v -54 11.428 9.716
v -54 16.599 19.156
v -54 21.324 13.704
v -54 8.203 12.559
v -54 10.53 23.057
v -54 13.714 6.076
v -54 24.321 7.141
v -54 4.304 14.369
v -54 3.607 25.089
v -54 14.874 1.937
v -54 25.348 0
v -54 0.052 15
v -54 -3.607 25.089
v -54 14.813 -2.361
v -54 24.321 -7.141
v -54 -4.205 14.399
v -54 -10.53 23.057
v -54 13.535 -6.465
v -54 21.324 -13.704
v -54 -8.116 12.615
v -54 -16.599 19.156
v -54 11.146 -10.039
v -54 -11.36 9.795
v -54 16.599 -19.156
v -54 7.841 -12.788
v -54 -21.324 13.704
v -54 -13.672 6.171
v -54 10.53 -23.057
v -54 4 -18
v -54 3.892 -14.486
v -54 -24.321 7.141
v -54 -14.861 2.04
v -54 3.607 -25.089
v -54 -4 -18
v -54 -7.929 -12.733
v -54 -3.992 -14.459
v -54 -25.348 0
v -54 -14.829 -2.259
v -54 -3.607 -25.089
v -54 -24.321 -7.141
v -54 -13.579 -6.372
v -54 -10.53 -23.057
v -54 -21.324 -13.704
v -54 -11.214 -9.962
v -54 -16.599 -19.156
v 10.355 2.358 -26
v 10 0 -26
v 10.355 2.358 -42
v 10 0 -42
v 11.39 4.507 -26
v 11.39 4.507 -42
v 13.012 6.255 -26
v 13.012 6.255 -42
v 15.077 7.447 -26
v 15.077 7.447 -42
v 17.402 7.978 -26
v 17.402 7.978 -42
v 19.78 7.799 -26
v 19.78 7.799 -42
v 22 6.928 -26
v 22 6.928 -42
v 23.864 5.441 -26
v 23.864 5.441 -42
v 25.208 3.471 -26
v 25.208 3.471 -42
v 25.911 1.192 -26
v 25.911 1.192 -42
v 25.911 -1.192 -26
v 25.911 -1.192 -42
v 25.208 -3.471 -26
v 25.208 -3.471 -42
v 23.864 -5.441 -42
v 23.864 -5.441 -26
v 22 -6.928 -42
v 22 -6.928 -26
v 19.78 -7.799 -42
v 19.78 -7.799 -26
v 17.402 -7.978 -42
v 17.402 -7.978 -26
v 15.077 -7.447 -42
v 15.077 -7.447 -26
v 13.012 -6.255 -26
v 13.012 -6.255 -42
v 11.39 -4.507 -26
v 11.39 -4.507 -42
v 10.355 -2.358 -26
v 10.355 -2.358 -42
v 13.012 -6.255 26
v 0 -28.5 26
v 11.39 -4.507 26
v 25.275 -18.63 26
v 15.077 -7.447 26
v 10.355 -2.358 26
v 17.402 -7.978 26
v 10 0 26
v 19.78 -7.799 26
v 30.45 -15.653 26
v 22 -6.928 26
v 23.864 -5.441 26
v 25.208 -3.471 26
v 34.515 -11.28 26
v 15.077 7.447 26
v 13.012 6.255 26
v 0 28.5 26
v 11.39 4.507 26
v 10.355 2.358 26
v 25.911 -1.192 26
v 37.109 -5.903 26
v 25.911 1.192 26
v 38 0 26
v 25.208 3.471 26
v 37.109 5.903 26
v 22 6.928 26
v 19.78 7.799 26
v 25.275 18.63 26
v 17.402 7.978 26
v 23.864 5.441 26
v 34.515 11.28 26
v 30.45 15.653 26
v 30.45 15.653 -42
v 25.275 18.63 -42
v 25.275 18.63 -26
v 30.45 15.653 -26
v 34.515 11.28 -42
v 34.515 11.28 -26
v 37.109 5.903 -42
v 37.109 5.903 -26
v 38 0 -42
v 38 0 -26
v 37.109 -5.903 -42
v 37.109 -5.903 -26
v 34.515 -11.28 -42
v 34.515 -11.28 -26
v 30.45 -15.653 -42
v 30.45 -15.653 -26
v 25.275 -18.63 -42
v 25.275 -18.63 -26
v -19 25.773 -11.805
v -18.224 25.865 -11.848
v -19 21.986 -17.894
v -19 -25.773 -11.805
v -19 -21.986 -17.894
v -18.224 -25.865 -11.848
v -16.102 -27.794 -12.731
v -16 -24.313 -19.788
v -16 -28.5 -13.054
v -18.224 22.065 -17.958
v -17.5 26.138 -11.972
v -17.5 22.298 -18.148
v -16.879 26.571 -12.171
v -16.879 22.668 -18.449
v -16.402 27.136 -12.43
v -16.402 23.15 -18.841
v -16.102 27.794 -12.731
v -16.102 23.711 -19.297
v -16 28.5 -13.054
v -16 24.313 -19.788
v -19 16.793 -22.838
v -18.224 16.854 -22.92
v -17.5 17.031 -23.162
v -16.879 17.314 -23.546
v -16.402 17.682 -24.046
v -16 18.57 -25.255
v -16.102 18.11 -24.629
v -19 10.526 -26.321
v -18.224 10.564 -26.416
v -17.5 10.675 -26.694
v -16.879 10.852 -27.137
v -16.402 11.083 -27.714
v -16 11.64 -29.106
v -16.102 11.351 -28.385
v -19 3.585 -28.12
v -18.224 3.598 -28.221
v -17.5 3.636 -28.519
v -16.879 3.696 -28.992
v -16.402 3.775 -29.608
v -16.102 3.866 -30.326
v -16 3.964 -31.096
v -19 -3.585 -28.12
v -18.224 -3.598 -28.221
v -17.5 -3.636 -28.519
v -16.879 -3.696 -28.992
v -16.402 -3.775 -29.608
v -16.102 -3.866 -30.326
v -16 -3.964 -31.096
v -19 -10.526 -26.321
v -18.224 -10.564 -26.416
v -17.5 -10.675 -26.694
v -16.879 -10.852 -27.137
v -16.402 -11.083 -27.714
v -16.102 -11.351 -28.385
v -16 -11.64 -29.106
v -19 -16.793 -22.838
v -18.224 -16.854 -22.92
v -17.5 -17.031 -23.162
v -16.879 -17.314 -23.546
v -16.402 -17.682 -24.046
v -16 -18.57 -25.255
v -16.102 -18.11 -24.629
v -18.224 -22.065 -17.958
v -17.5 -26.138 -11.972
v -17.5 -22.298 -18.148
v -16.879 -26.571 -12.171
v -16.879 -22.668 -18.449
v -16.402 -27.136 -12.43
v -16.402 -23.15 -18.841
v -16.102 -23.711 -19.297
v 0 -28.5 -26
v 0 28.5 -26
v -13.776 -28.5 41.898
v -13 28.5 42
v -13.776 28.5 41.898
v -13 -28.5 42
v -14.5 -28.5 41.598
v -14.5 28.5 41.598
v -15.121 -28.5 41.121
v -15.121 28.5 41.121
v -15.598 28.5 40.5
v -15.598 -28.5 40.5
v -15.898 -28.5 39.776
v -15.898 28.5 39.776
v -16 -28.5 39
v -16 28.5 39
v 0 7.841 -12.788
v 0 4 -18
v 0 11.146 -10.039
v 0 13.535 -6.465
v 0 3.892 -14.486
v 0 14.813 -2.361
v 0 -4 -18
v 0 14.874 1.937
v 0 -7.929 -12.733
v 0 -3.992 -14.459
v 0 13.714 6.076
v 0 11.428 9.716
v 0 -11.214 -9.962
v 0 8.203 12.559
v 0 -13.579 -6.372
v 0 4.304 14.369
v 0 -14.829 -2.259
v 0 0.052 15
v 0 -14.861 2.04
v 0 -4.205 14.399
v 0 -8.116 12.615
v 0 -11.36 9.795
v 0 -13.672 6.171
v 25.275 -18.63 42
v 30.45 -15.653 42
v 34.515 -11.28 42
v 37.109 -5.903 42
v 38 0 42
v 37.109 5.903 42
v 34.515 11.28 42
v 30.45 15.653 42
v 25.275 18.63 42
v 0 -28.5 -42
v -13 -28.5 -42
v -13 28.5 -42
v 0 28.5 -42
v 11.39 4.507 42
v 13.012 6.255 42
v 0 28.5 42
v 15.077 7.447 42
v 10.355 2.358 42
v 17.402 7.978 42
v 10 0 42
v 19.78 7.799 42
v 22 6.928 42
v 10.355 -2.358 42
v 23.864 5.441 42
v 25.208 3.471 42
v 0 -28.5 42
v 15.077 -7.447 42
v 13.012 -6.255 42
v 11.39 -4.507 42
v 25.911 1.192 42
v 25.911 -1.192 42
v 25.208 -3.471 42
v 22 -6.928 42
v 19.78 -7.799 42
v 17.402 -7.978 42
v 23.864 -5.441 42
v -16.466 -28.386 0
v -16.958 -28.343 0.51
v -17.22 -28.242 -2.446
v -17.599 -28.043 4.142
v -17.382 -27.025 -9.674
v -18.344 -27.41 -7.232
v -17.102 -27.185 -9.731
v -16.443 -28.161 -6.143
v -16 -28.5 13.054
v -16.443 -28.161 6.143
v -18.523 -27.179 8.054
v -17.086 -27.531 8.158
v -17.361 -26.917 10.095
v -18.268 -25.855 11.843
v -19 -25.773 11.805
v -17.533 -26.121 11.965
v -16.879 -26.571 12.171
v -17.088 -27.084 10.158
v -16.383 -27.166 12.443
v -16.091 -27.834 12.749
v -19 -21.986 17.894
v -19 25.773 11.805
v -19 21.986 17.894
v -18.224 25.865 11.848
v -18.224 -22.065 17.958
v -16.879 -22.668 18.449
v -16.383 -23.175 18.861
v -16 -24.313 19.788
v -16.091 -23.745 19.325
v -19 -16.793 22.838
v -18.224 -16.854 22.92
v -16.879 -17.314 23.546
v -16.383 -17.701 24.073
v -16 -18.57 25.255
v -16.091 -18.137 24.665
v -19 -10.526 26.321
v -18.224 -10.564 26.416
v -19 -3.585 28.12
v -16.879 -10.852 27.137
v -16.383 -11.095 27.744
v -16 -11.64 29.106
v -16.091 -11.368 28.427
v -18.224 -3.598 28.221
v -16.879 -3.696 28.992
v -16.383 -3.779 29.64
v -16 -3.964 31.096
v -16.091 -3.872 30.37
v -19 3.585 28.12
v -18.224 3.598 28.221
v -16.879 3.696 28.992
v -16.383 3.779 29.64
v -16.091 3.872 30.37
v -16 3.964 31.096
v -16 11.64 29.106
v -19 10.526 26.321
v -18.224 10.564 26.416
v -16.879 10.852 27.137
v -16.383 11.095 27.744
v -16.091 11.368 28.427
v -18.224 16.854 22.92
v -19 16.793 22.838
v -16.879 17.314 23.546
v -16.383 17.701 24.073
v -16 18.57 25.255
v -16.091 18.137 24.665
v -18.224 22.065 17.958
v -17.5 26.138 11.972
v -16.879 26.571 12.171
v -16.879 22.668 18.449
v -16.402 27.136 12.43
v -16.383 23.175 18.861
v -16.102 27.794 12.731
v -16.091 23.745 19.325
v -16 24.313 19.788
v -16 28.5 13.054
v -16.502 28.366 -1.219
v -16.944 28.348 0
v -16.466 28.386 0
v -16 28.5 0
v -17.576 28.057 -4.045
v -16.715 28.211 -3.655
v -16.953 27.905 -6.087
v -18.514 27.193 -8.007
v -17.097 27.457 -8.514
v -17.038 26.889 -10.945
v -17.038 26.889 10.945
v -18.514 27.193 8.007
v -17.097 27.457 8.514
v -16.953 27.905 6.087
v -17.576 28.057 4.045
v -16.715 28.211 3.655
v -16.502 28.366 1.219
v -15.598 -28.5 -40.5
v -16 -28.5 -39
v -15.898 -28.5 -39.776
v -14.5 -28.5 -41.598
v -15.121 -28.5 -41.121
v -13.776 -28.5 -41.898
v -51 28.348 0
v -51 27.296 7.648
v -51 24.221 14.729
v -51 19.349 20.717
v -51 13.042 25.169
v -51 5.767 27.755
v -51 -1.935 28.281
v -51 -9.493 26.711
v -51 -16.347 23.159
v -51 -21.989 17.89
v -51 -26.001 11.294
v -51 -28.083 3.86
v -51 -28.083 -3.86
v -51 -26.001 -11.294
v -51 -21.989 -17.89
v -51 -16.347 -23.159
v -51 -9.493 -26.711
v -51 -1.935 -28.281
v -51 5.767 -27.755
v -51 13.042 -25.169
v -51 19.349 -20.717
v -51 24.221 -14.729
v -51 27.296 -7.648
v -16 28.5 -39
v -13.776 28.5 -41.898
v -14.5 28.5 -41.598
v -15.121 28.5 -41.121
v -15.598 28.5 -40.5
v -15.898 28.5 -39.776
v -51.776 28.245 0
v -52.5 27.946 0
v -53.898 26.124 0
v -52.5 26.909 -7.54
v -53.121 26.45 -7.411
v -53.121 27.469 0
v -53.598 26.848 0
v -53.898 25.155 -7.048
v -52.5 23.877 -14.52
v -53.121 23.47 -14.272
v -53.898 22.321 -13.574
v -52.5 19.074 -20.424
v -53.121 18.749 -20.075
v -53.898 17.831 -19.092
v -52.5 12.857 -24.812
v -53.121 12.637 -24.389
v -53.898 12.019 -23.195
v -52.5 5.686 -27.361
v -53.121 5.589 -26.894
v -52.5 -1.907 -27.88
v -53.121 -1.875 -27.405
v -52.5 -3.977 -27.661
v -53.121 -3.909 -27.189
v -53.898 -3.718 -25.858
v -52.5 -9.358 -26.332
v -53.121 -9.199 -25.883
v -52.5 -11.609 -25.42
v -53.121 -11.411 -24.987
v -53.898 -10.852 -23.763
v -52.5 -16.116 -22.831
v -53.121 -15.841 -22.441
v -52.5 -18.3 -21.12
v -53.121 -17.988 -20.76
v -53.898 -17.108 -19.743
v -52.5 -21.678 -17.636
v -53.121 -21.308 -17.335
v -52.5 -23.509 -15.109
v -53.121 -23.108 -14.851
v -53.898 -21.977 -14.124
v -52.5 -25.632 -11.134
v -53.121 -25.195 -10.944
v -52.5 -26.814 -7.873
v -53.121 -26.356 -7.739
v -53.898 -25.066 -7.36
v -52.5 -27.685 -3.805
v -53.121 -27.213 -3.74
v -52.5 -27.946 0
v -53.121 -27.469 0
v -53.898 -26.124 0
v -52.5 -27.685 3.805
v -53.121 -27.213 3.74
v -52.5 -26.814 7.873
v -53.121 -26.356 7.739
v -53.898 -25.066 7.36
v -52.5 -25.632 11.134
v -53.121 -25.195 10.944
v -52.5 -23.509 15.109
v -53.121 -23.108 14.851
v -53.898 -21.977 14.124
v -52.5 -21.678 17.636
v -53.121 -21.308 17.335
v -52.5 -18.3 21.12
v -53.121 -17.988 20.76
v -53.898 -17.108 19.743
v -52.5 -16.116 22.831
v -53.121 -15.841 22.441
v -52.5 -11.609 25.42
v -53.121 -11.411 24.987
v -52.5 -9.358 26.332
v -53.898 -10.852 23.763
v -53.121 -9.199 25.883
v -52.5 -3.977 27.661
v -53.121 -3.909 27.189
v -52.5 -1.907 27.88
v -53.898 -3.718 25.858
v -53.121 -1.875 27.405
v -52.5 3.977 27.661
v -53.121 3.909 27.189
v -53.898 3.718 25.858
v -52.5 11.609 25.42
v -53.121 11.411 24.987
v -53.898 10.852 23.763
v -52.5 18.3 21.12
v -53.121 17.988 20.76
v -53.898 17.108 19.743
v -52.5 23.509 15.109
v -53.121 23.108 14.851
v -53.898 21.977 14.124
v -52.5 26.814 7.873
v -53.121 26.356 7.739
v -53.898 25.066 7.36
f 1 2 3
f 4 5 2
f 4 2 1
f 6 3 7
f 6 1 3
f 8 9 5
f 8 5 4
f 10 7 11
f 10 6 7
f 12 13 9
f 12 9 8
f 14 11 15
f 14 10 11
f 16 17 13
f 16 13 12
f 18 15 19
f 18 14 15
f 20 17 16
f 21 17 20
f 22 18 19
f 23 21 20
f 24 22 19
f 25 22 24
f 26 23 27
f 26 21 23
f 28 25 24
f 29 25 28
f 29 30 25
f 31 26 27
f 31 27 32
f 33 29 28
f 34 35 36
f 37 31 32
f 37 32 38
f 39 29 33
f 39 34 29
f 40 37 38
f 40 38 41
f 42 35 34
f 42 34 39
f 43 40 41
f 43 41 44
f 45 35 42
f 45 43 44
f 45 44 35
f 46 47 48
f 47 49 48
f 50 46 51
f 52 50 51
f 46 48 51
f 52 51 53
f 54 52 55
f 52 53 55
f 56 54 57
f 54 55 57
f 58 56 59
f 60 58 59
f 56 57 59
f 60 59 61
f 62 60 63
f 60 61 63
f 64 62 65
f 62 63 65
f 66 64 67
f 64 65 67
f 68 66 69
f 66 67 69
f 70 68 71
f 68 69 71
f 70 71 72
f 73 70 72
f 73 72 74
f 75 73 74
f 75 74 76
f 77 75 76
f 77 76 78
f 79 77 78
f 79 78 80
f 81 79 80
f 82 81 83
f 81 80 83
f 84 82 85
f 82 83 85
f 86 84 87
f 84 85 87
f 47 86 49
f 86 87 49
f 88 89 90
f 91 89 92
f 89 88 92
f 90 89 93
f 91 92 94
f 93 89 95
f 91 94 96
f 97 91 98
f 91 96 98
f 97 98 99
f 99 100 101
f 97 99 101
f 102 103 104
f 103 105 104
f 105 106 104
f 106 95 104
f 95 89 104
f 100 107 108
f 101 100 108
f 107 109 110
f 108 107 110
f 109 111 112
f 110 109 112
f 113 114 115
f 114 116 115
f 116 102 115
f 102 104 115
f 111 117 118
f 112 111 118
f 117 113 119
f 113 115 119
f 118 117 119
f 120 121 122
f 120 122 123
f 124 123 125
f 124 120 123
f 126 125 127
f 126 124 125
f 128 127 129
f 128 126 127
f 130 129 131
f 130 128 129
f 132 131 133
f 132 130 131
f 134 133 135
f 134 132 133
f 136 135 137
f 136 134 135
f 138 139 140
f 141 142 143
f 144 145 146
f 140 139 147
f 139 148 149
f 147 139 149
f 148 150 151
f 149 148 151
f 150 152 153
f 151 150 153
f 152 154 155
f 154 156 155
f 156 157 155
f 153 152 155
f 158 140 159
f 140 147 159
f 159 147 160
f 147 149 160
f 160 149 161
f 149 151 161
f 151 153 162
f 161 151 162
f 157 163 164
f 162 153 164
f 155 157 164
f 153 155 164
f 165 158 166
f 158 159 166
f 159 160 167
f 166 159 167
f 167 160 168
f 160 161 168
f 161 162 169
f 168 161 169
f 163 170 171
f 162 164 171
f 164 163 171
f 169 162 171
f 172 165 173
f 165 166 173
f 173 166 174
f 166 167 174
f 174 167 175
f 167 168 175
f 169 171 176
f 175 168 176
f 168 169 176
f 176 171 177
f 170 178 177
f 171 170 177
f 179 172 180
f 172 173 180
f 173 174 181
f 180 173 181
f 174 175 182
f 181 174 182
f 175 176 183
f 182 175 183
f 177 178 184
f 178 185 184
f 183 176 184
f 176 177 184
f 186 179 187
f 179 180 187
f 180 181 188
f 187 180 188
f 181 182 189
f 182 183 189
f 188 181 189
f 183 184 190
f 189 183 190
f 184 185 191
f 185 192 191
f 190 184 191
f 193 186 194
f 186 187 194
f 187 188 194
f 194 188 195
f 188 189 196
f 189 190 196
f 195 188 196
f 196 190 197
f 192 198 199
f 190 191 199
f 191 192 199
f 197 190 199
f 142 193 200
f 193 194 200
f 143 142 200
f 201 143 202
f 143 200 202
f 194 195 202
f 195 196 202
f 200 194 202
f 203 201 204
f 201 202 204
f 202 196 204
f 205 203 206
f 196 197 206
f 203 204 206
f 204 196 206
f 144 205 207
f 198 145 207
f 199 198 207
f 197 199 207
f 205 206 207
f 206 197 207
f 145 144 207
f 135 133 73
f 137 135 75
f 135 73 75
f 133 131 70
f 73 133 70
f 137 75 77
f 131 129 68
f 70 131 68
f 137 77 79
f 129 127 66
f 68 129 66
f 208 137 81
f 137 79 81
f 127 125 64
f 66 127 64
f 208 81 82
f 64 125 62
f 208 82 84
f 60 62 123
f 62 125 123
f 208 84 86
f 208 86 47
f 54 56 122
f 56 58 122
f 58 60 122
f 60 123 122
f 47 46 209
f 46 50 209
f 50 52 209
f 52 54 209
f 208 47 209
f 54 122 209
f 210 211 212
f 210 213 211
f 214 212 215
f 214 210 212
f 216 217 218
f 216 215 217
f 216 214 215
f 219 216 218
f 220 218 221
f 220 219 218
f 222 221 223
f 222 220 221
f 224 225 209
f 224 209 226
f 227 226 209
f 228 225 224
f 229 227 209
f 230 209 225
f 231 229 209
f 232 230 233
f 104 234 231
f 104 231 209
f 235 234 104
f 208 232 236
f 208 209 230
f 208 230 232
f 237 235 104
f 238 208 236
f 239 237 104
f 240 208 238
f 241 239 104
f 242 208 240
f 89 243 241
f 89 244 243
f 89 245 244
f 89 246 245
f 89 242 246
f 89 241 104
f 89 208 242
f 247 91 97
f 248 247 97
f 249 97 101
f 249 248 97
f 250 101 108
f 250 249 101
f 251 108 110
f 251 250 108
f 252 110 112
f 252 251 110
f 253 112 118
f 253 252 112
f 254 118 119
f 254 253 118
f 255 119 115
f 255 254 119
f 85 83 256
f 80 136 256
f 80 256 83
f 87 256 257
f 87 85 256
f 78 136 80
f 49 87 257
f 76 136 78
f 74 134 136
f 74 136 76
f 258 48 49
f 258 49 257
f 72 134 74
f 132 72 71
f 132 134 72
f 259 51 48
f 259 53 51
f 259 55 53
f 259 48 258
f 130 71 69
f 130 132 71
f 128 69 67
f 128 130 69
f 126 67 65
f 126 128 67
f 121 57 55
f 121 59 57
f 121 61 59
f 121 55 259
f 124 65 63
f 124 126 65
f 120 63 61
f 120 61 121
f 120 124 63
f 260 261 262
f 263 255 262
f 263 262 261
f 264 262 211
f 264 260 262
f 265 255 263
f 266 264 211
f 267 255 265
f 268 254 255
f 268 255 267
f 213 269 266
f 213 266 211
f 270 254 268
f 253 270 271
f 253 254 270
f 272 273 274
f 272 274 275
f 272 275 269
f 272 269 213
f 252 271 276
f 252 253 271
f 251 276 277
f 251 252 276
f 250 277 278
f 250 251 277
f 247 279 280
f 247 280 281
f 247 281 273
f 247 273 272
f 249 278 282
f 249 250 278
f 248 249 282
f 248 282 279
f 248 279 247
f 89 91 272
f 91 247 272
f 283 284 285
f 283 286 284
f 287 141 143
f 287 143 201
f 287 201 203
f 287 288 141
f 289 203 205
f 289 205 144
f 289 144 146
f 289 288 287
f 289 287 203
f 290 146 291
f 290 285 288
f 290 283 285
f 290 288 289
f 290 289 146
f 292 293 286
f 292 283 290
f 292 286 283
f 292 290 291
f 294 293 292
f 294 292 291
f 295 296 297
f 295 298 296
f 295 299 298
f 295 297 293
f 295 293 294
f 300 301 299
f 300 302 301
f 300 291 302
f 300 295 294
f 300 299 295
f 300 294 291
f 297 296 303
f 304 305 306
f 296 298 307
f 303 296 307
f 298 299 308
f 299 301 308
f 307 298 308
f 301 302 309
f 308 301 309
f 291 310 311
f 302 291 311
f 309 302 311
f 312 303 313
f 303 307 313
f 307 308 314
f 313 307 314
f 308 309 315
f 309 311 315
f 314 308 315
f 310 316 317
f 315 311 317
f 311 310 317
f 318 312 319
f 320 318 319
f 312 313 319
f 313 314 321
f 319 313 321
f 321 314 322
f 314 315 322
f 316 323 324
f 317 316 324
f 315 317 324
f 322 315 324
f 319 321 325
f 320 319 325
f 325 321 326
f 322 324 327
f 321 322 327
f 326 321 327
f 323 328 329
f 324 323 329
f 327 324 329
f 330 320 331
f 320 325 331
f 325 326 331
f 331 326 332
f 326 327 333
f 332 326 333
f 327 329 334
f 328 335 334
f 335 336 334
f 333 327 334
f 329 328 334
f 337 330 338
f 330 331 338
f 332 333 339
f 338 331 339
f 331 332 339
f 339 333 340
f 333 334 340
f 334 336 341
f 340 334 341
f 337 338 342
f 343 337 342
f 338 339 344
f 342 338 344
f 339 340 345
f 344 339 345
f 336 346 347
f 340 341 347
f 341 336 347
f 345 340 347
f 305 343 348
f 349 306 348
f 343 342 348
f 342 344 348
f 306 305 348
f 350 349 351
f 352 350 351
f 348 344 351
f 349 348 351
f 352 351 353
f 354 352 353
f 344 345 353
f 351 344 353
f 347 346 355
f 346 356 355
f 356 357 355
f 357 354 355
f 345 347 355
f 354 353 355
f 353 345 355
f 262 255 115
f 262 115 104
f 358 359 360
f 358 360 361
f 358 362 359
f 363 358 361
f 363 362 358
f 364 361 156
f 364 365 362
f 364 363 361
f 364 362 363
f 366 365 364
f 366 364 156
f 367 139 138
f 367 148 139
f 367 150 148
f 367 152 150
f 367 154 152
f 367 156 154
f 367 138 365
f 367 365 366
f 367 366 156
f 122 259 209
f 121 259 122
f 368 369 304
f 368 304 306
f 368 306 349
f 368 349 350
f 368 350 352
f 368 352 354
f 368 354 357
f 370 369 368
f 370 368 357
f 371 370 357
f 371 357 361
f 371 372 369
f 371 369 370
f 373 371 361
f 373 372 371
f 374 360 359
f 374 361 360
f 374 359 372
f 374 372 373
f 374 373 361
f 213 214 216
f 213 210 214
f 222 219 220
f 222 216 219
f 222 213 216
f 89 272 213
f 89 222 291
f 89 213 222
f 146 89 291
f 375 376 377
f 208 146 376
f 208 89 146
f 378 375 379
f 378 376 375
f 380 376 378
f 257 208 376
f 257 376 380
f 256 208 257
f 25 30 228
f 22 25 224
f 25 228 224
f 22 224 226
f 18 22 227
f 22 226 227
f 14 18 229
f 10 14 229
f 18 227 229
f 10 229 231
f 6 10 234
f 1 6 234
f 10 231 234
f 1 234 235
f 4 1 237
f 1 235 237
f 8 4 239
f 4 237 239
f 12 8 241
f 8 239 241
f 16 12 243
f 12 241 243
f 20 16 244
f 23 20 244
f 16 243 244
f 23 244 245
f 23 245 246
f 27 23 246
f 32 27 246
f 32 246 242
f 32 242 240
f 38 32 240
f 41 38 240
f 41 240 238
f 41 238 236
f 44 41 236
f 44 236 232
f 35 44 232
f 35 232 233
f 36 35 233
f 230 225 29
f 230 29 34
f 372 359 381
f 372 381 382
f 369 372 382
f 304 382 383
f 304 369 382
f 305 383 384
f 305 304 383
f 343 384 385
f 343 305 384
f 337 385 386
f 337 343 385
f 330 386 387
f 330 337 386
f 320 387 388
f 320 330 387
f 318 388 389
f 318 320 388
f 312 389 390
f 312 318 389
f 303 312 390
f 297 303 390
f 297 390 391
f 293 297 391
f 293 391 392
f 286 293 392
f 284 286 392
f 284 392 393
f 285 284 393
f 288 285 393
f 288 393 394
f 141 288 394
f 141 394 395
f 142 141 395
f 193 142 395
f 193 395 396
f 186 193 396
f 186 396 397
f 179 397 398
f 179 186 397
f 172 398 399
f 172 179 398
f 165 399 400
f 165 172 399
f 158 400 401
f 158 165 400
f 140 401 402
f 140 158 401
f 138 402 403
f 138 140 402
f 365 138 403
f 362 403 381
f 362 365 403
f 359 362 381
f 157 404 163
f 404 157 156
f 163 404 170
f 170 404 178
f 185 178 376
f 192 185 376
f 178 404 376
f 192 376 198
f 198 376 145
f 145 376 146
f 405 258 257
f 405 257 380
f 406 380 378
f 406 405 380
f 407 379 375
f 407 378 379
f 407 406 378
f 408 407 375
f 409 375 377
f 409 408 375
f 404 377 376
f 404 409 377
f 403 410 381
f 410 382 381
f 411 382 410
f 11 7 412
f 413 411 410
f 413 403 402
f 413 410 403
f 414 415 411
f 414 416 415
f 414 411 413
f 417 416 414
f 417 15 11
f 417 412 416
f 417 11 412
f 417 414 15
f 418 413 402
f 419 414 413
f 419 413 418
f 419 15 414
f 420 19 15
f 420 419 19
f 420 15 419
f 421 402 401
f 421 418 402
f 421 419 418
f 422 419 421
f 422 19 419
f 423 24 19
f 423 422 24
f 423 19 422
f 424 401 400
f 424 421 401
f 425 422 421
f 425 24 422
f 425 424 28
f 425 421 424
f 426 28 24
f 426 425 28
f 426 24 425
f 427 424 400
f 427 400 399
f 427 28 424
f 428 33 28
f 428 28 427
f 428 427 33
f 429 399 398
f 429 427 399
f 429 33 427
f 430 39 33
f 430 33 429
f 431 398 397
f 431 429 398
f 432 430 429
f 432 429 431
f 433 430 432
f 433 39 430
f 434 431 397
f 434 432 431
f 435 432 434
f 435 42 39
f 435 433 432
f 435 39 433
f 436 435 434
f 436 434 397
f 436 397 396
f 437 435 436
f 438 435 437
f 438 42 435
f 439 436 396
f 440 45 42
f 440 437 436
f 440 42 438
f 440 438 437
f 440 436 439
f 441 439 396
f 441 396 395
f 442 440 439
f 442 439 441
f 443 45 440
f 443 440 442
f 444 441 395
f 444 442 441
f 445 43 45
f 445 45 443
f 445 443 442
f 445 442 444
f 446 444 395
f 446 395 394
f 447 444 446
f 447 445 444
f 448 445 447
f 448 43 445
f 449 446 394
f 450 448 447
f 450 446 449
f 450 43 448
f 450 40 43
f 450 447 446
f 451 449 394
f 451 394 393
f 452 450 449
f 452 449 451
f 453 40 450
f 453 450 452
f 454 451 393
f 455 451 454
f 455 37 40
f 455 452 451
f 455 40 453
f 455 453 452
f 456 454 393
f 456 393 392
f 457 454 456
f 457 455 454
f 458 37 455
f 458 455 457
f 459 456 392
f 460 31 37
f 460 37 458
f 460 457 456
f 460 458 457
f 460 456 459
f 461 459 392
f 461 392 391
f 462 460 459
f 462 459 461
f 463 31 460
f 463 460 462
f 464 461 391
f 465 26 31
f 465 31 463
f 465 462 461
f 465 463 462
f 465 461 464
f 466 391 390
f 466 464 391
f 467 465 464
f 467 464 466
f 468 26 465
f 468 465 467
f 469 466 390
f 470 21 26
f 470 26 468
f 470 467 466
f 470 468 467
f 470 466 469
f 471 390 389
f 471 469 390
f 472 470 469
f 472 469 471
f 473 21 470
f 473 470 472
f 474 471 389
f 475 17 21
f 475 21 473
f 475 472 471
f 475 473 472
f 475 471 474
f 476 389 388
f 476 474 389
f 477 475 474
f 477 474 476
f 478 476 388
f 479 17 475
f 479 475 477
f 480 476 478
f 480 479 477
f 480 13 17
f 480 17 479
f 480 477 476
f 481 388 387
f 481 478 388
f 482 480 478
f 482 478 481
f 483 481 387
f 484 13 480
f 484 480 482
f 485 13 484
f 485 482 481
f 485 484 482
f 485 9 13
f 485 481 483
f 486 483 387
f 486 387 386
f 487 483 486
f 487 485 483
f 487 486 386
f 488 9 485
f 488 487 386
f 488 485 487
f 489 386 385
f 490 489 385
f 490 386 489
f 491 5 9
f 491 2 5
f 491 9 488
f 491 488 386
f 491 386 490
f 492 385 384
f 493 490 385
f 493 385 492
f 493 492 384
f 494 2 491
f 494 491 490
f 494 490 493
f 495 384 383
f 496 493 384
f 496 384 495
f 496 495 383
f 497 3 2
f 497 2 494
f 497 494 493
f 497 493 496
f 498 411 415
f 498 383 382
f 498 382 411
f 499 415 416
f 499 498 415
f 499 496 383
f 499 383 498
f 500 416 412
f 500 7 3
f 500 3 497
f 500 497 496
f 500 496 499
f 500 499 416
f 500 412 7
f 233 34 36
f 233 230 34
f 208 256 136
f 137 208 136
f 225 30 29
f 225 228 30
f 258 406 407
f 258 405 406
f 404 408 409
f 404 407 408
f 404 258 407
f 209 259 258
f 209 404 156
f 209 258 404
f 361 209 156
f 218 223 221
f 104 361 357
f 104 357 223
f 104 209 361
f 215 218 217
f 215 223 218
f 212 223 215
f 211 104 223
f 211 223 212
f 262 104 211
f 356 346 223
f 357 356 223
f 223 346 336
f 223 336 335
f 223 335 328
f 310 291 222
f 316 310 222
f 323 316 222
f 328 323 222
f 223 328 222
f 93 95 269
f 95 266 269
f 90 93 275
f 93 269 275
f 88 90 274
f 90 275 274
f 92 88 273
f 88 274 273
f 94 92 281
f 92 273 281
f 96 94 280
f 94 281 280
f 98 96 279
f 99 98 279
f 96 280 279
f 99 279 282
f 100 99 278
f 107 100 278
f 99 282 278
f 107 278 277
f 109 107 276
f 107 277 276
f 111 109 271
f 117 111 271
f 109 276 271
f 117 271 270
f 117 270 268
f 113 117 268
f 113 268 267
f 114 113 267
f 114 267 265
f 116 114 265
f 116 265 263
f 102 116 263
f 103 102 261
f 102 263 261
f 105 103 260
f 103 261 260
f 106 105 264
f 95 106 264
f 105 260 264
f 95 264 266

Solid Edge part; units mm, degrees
sketch "Sketch1" plane through (0, 0, 0) normal (1, 0, 0) x (0, 1, 0)
  line L0 (28.5, 42) -> (-28.5, 42)
  line L1 (-28.5, 42) -> (-28.5, -42)
  line L2 (-28.5, -42) -> (28.5, -42)
  line L3 (28.5, -42) -> (28.5, 42)
extrude "ExtrudedProtrusion_1" add sketch "Sketch1" against normal blind 16
sketch "Sketch2" plane through (-8, 0, -42) normal (0, 0, -1) x (-1, 0, 0)
  line L0 (-8, 28.5) -> (-33.2751, 18.6299)
  line L1 (-8, 28.5) -> (-3.9571, 28.5)
  line L2 (-3.9571, 28.5) -> (-3.9571, -28.5)
  line L3 (-3.9571, -28.5) -> (-8, -28.5)
  line L4 (-8, -28.5) -> (-33.2751, -18.6299)
  arc A0 (-33.2751, -18.6299) -> (-33.2751, 18.6299) centre (-26, 0) cw
extrude "ExtrudedProtrusion_2" add sketch "Sketch2" against normal blind 16
sketch "Sketch3" plane through (-8, 0, -42) normal (0, 0, -1) x (-1, 0, 0)
  circle A0 centre (-26, 0) radius 8
extrude "ExtrudedCutout_4" cut sketch "Sketch3" against normal blind 84.082
mirror "Mirror1" about plane through (0, 0, 0) normal (0, 0, 1) of "ExtrudedProtrusion_2"
mirror "Mirror2" about plane through (0, 0, 0) normal (0, 0, 1) of "ExtrudedCutout_4"
sketch "Sketch4" plane through (-16, 0, 0) normal (-1, 0, 0) x (0, 1, 0)
  circle A0 centre (0, 0) radius 28.3475
extrude "ExtrudedProtrusion_5" add sketch "Sketch4" along normal blind 38
extrude "Cutout1" [suppressed]
fillet "Round_3" radius 3 4 edges at (-54, -28.3475, 0) (-16, -28.3475, 0) (-16, 0, 42) (-16, 0, -42)
sketch "Sketch5" plane through (-16, 0, -26.0271) normal (-1, 0, 0) x (0, 0, 1)
  line L0 (8.0271, -4) -> (11.568, -3.9916)
  line L1 (8.0271, 4) -> (8.0271, -4)
  line L2 (11.5408, 3.8919) -> (8.0271, 4)
  arc A0 (11.5408, 3.8919) -> (11.568, -3.9916) centre (26.0271, 0) cw
extrude "ExtrudedCutout_6" cut sketch "Sketch5" along normal mid plane 204.9146
